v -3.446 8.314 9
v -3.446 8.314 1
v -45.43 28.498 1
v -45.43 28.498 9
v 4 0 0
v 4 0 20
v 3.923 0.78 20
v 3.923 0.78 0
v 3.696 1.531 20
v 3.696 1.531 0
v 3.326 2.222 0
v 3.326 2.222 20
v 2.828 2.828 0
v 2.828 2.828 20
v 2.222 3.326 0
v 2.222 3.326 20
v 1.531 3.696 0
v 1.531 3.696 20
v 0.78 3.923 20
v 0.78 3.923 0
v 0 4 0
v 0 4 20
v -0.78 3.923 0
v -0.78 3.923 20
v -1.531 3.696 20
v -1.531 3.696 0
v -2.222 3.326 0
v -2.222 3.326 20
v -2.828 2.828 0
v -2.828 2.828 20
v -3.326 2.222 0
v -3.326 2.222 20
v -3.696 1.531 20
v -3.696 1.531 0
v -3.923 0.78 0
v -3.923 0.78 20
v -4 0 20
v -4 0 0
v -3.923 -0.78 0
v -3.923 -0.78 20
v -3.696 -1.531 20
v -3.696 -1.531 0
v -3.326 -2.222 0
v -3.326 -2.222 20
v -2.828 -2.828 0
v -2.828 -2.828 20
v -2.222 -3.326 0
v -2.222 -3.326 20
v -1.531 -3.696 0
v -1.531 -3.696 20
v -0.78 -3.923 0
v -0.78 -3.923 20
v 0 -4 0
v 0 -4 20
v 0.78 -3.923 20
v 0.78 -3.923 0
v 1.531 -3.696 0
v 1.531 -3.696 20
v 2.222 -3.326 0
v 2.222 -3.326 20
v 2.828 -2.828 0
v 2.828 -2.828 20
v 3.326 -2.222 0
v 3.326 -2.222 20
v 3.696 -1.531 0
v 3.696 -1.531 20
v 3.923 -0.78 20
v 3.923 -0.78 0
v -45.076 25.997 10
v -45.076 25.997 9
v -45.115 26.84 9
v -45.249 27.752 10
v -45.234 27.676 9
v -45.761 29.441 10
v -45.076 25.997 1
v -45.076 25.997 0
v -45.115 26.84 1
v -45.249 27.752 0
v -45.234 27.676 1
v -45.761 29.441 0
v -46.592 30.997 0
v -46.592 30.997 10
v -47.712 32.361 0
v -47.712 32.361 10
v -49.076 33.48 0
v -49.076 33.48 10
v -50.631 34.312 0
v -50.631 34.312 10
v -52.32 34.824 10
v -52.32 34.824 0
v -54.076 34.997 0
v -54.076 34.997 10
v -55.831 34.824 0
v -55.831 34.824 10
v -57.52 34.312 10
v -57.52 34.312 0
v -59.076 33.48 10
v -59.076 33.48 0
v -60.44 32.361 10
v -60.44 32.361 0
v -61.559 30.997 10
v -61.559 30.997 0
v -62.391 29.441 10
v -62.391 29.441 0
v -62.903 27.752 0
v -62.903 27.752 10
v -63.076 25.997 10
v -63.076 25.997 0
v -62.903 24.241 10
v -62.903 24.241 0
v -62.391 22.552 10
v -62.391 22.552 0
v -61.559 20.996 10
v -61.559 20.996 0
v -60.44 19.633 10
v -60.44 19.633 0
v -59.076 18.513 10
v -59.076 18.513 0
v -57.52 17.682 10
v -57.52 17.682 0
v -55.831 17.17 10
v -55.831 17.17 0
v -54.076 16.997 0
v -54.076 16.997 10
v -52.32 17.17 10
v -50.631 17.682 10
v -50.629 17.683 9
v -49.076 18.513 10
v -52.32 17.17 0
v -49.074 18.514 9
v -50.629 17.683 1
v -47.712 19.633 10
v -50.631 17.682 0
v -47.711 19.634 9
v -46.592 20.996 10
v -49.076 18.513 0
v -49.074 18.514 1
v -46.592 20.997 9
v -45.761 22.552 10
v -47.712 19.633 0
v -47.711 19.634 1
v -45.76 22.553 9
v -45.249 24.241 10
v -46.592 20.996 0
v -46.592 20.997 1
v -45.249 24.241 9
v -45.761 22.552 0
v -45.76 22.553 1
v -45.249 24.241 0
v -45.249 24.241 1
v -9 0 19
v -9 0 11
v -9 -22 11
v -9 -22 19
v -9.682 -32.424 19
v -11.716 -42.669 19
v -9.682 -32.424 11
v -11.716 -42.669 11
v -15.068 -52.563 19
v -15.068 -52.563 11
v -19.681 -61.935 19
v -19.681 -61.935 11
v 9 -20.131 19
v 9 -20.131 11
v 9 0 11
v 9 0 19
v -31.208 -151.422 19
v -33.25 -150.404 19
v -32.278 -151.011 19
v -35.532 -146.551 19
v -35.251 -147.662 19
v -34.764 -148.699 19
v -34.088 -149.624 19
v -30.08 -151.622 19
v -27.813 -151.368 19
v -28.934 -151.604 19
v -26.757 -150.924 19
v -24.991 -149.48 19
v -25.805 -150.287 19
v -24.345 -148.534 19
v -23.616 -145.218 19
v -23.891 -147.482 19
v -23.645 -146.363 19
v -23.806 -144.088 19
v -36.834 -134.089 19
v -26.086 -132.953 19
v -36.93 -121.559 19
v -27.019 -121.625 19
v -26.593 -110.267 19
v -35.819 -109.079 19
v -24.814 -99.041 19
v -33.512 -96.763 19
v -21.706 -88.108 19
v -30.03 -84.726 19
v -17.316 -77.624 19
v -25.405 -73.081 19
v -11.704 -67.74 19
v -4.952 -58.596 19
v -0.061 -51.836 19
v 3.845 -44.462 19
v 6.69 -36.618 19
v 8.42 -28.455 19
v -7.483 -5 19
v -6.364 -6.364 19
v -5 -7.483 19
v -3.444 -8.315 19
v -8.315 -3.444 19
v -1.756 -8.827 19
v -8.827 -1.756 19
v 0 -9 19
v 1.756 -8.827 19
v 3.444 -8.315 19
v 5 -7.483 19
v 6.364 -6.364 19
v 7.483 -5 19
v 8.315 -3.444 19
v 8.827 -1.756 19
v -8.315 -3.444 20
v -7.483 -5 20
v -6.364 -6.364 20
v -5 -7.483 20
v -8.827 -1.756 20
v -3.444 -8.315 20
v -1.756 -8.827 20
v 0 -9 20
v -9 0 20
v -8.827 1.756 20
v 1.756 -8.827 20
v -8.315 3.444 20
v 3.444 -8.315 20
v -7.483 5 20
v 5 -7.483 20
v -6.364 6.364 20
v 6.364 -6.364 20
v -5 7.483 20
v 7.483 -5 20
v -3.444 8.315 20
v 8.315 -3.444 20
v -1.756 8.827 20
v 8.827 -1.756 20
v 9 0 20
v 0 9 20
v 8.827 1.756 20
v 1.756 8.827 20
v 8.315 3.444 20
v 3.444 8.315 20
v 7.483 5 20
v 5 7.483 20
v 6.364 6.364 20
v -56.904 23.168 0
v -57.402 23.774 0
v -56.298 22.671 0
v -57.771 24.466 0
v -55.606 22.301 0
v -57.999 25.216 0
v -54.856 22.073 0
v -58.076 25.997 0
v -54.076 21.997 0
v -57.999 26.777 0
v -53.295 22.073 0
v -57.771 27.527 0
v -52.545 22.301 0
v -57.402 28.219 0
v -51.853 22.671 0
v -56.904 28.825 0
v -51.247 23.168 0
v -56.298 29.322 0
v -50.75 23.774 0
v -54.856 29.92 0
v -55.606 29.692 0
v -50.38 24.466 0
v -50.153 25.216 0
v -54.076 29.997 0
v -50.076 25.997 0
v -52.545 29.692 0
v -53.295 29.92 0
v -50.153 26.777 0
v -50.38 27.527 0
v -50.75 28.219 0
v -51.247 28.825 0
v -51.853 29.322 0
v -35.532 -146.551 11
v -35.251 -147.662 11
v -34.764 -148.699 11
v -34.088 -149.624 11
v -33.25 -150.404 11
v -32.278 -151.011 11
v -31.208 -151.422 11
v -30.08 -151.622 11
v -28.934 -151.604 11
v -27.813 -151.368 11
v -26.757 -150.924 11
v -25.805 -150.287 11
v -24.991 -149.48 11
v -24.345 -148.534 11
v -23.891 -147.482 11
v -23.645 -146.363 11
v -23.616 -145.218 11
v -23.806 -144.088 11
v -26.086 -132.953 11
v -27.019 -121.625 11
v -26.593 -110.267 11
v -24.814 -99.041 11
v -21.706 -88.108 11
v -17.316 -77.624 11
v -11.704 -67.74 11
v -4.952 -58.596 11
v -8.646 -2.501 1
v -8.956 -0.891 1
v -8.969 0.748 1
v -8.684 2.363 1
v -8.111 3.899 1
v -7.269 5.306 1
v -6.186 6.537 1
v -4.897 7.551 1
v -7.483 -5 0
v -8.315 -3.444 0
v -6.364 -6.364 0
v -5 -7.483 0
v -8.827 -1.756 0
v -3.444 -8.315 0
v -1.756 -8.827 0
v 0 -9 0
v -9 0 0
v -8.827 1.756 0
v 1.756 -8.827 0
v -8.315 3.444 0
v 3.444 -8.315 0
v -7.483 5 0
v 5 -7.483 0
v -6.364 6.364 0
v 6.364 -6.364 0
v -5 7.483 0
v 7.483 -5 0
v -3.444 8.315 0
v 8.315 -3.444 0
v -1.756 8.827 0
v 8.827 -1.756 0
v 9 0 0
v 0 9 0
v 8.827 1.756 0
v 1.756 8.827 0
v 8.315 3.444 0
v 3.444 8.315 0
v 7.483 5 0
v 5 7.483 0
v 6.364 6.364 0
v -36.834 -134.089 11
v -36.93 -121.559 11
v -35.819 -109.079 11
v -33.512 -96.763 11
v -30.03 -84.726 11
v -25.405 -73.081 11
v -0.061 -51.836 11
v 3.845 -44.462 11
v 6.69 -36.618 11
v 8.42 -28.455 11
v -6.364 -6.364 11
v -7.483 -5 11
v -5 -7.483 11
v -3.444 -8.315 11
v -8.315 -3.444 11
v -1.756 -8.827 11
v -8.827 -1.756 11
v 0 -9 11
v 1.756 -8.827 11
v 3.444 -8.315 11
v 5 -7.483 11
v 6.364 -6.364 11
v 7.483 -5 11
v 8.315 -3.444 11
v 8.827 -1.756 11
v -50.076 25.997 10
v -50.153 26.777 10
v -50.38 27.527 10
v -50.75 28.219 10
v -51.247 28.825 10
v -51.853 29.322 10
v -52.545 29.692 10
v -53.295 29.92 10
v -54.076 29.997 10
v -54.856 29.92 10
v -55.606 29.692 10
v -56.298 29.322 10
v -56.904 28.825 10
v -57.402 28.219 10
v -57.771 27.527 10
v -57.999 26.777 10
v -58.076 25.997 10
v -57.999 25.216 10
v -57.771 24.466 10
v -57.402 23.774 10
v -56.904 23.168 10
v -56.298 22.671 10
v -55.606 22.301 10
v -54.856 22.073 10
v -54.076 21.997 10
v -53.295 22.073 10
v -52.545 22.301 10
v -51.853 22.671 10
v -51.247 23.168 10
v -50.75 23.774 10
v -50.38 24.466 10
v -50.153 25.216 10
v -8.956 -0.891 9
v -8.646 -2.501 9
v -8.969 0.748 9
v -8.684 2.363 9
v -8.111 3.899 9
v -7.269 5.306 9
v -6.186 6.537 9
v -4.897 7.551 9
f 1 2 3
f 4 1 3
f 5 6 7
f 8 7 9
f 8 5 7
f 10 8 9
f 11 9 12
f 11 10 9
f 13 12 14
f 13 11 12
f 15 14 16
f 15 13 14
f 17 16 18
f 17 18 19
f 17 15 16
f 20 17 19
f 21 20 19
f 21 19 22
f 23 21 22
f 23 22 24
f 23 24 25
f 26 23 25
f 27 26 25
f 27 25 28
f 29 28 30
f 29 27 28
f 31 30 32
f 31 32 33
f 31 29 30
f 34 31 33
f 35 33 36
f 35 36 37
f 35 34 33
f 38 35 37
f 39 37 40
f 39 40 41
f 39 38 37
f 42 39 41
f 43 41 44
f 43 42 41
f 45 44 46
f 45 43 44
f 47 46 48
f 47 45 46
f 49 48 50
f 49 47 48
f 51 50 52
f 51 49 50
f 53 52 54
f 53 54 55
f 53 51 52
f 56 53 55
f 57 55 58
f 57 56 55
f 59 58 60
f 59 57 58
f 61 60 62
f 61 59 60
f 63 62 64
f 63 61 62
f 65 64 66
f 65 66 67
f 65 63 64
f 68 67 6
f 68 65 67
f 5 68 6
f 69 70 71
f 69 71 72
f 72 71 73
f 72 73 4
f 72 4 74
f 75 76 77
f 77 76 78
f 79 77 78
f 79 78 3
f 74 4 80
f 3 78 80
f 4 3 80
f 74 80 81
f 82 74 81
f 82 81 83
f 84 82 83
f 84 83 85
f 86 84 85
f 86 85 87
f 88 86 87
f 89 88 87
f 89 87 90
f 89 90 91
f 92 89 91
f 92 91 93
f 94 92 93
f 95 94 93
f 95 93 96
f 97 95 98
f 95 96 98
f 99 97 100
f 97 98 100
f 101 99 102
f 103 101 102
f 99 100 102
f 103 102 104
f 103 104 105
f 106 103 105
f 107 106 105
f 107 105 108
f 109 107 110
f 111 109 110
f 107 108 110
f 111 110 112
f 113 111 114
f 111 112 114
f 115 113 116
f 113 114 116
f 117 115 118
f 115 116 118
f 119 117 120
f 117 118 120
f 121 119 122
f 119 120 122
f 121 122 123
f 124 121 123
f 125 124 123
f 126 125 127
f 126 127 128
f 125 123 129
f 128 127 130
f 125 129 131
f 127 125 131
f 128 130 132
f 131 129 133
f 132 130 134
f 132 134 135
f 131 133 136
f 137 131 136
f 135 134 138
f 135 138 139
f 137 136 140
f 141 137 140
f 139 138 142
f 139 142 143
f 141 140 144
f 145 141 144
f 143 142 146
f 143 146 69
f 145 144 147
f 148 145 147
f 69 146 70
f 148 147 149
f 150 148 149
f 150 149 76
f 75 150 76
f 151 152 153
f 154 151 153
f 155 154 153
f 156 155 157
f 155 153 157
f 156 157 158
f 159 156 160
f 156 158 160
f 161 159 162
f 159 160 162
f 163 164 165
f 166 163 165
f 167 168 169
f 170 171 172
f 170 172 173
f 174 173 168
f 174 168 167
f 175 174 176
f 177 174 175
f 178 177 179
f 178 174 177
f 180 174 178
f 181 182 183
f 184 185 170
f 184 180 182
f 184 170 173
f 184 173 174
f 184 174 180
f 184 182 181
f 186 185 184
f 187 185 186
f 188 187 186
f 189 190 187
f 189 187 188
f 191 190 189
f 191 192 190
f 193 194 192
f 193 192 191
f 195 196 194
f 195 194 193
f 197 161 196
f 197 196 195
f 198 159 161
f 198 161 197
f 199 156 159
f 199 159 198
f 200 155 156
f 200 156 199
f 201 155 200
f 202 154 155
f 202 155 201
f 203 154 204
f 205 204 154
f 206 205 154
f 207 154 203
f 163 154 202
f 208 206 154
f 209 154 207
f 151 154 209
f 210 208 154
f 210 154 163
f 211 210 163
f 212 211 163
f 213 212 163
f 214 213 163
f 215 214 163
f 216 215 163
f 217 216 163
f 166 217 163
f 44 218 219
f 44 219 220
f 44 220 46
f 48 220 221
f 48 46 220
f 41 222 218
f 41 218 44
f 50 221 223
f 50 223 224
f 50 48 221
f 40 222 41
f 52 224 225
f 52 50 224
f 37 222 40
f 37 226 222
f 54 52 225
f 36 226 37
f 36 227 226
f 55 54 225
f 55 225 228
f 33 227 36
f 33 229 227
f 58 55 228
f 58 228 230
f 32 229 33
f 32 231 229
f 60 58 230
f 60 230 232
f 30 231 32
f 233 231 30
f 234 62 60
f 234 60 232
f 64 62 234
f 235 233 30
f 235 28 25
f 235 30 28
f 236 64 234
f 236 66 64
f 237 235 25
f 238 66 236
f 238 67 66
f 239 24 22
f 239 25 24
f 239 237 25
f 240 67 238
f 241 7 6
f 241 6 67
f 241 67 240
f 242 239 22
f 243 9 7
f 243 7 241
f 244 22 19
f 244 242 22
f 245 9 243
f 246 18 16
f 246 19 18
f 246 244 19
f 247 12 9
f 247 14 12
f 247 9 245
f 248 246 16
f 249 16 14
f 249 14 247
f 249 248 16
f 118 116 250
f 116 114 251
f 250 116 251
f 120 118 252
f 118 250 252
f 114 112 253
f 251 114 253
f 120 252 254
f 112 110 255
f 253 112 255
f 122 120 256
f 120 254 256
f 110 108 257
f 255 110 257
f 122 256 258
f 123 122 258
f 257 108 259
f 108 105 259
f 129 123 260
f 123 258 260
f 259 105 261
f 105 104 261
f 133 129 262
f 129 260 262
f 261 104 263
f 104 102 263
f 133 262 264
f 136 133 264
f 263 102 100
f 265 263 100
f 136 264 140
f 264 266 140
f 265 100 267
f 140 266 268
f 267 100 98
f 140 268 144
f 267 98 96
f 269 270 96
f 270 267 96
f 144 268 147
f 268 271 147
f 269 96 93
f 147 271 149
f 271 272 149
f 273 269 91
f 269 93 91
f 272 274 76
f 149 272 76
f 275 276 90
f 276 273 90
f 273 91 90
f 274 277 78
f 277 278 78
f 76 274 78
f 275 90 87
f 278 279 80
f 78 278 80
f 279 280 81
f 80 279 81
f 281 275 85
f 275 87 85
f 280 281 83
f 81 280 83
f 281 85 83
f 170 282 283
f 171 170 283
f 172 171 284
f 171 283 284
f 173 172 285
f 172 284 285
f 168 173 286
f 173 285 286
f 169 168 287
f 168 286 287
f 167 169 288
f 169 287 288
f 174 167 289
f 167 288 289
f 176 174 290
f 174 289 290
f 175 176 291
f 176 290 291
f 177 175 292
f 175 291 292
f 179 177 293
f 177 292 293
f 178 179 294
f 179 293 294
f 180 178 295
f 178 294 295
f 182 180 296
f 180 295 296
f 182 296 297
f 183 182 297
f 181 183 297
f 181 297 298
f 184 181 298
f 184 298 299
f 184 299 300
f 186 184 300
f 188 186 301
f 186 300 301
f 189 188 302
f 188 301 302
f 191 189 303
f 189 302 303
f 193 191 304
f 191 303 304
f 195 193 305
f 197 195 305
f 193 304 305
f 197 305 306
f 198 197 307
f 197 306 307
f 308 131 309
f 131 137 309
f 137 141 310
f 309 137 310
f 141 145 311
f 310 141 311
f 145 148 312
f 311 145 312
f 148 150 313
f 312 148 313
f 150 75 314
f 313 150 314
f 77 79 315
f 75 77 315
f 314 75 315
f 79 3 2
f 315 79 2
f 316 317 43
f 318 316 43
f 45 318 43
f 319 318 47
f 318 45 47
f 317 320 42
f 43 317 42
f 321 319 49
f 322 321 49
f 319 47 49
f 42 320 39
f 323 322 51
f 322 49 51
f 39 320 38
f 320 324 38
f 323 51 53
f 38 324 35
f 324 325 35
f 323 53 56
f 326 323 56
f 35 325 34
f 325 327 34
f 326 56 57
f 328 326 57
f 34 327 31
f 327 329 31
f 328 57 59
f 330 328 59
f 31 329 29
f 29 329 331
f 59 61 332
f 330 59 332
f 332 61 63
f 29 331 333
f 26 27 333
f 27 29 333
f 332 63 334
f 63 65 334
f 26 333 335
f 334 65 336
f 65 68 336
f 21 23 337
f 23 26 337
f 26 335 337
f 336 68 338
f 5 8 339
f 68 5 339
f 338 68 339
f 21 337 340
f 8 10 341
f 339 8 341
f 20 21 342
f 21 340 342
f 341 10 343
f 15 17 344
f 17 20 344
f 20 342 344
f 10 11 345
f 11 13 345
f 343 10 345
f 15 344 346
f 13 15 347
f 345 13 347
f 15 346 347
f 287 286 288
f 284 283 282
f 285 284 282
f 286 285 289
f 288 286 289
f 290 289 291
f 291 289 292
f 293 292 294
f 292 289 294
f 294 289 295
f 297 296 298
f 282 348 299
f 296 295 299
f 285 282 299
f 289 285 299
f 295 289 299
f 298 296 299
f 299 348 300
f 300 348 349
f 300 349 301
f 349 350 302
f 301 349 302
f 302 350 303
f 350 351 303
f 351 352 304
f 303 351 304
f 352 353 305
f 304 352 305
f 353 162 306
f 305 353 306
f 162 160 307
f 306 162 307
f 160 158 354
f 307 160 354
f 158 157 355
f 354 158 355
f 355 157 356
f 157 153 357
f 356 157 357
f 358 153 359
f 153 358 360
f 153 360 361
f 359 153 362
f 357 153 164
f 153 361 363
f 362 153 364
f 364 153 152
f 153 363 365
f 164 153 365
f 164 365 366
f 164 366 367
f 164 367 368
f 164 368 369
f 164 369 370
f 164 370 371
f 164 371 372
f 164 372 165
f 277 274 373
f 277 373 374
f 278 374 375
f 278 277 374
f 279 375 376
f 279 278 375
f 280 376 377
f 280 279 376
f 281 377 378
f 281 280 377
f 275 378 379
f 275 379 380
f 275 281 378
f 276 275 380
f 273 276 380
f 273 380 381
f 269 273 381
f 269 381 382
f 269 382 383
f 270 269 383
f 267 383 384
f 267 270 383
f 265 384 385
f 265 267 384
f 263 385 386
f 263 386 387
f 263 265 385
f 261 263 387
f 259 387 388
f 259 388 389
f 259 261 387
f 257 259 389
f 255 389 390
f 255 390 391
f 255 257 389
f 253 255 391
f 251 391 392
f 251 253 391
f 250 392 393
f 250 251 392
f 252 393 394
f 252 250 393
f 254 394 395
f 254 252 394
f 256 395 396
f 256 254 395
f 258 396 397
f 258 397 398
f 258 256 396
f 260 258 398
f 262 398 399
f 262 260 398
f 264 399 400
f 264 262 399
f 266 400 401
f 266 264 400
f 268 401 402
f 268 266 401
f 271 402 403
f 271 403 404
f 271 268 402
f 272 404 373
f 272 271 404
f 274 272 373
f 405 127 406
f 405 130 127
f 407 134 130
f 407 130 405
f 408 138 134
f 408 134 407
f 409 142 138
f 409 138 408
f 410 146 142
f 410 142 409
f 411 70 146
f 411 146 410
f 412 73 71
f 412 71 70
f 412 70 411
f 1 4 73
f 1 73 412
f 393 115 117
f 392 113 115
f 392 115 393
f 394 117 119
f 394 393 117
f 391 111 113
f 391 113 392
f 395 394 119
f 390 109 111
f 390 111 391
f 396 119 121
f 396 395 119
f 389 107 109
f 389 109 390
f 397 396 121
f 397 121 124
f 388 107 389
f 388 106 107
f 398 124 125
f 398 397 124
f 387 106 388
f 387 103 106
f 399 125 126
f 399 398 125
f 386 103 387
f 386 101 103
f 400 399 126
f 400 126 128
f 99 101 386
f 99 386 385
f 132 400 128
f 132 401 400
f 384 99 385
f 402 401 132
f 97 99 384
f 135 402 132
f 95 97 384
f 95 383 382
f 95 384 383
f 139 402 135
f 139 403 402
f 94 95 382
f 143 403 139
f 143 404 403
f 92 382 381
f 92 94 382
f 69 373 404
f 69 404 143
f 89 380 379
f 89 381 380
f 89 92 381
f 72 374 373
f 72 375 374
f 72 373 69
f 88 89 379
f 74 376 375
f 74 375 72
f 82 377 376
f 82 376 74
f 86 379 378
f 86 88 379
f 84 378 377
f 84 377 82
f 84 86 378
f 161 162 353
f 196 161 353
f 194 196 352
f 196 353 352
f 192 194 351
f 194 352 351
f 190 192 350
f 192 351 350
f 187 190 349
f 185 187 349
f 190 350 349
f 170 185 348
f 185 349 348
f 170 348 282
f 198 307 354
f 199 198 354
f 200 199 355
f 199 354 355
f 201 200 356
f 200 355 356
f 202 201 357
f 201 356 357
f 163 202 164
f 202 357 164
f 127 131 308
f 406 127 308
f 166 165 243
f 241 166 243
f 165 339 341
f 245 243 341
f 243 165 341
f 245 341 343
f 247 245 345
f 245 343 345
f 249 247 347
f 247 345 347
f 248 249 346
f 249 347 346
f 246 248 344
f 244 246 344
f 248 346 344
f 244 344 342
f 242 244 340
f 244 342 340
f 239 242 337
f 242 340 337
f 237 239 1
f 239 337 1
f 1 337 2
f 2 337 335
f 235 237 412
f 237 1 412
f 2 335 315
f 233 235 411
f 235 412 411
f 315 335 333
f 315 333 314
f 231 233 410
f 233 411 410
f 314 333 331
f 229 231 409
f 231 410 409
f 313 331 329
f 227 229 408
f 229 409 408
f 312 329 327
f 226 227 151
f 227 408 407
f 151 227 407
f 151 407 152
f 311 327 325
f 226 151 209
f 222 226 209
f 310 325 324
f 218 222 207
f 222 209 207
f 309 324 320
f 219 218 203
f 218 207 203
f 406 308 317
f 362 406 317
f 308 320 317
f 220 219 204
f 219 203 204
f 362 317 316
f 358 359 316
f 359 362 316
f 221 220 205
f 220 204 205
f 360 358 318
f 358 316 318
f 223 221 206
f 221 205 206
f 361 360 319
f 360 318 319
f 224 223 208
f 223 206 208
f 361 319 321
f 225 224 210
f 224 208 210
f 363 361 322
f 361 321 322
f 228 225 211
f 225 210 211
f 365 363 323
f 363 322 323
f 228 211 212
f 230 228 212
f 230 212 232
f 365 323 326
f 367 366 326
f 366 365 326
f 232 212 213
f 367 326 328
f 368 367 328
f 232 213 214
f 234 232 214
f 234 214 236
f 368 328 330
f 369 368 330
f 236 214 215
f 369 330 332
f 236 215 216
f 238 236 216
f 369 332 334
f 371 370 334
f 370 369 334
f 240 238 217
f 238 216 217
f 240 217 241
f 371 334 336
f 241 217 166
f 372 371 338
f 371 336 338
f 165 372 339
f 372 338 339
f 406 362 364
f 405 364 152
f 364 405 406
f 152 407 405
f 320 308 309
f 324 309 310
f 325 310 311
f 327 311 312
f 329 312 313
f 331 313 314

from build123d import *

# Parameters (mm, degrees)
SKETCH_1_R        = 9
SKETCH_1_R_2      = 4
EXTRUDE_1_DEPTH   = 10
EXTRUDE_1_2_DEPTH = 10
EXTRUDE_START     = -9
EXTRUDE_2_DEPTH   = 8
EXTRUDE_START_2   = 1
EXTRUDE_3_DEPTH   = 8
SKETCH_5_R        = 9
SKETCH_5_R_2      = 4
EXTRUDE_4_DEPTH   = 10


with BuildPart() as part:
    # 草图1 → 凸台-拉伸1 (new body)
    with BuildSketch(Plane.XY):
        Circle(SKETCH_1_R)
        Circle(SKETCH_1_R_2, mode=Mode.SUBTRACT)
    extrude(amount=EXTRUDE_1_DEPTH)



with BuildPart() as body_2:
    # 草图1 → Extrude 1 2 (new body)
    with BuildSketch(Plane.XY):
        with Locations((-54.075649928, 25.996616797)):
            Circle(SKETCH_1_R)
        with Locations((-54.075649928, 25.996616797)):
            Circle(SKETCH_1_R_2, mode=Mode.SUBTRACT)
    extrude(amount=EXTRUDE_1_2_DEPTH)


with BuildPart() as part_1:
    add(part.part)

    add(body_2.part)  # 凸台-拉伸2 merges body 2
    # 草图2 → 凸台-拉伸2 (add)
    with BuildSketch(Plane.XY.offset(10).offset(EXTRUDE_START)):
        with BuildLine():
            Line((-50.629470149, 17.682541688), (-8.645503138, -2.501054876))
            ThreePointArc((-8.645503138, -2.501054876), (-8.111347489, 3.89949252), (-3.446179779, 8.31407511))
            Line((-3.446179779, 8.31407511), (-45.43014679, 28.497671673))
            ThreePointArc((-45.43014679, 28.497671673), (-45.964302438, 22.097124278), (-50.629470149, 17.682541688))
        make_face()
    extrude(amount=EXTRUDE_2_DEPTH)



with BuildPart() as body_2_2:
    # 草图4 → 凸台-拉伸3 (new body)
    with BuildSketch(Plane.XY.offset(10).offset(EXTRUDE_START_2)):
        with BuildLine():
            Line((-9, 0), (-9, -22))
            ThreePointArc((-9, -22), (-11.716267411, -42.669414049), (-19.680616928, -61.935236704))
            ThreePointArc((-19.680616928, -61.935236704), (-34.813823432, -102.892867464), (-35.532086941, -146.550920033))
            ThreePointArc((-35.532086941, -146.550920033), (-28.368122981, -151.512581419), (-23.805971944, -144.087809285))
            ThreePointArc((-23.805971944, -144.087809285), (-24.813823432, -99.040827427), (-4.952136173, -58.596300996))
            ThreePointArc((-4.952136173, -58.596300996), (5.404218945, -40.589645691), (9, -20.130806888))
            Line((9, -20.130806888), (9, 0))
            ThreePointArc((9, 0), (0, -9), (-9, 0))
        make_face()
    extrude(amount=EXTRUDE_3_DEPTH)


with BuildPart() as part_2:
    add(part_1.part)

    add(body_2_2.part)  # 凸台-拉伸4 merges body 2 2
    # 草图5 → 凸台-拉伸4 (add)
    with BuildSketch(Plane.XY.offset(10)):
        Circle(SKETCH_5_R)
        Circle(SKETCH_5_R_2, mode=Mode.SUBTRACT)
    extrude(amount=EXTRUDE_4_DEPTH)


solid = part_2.part
